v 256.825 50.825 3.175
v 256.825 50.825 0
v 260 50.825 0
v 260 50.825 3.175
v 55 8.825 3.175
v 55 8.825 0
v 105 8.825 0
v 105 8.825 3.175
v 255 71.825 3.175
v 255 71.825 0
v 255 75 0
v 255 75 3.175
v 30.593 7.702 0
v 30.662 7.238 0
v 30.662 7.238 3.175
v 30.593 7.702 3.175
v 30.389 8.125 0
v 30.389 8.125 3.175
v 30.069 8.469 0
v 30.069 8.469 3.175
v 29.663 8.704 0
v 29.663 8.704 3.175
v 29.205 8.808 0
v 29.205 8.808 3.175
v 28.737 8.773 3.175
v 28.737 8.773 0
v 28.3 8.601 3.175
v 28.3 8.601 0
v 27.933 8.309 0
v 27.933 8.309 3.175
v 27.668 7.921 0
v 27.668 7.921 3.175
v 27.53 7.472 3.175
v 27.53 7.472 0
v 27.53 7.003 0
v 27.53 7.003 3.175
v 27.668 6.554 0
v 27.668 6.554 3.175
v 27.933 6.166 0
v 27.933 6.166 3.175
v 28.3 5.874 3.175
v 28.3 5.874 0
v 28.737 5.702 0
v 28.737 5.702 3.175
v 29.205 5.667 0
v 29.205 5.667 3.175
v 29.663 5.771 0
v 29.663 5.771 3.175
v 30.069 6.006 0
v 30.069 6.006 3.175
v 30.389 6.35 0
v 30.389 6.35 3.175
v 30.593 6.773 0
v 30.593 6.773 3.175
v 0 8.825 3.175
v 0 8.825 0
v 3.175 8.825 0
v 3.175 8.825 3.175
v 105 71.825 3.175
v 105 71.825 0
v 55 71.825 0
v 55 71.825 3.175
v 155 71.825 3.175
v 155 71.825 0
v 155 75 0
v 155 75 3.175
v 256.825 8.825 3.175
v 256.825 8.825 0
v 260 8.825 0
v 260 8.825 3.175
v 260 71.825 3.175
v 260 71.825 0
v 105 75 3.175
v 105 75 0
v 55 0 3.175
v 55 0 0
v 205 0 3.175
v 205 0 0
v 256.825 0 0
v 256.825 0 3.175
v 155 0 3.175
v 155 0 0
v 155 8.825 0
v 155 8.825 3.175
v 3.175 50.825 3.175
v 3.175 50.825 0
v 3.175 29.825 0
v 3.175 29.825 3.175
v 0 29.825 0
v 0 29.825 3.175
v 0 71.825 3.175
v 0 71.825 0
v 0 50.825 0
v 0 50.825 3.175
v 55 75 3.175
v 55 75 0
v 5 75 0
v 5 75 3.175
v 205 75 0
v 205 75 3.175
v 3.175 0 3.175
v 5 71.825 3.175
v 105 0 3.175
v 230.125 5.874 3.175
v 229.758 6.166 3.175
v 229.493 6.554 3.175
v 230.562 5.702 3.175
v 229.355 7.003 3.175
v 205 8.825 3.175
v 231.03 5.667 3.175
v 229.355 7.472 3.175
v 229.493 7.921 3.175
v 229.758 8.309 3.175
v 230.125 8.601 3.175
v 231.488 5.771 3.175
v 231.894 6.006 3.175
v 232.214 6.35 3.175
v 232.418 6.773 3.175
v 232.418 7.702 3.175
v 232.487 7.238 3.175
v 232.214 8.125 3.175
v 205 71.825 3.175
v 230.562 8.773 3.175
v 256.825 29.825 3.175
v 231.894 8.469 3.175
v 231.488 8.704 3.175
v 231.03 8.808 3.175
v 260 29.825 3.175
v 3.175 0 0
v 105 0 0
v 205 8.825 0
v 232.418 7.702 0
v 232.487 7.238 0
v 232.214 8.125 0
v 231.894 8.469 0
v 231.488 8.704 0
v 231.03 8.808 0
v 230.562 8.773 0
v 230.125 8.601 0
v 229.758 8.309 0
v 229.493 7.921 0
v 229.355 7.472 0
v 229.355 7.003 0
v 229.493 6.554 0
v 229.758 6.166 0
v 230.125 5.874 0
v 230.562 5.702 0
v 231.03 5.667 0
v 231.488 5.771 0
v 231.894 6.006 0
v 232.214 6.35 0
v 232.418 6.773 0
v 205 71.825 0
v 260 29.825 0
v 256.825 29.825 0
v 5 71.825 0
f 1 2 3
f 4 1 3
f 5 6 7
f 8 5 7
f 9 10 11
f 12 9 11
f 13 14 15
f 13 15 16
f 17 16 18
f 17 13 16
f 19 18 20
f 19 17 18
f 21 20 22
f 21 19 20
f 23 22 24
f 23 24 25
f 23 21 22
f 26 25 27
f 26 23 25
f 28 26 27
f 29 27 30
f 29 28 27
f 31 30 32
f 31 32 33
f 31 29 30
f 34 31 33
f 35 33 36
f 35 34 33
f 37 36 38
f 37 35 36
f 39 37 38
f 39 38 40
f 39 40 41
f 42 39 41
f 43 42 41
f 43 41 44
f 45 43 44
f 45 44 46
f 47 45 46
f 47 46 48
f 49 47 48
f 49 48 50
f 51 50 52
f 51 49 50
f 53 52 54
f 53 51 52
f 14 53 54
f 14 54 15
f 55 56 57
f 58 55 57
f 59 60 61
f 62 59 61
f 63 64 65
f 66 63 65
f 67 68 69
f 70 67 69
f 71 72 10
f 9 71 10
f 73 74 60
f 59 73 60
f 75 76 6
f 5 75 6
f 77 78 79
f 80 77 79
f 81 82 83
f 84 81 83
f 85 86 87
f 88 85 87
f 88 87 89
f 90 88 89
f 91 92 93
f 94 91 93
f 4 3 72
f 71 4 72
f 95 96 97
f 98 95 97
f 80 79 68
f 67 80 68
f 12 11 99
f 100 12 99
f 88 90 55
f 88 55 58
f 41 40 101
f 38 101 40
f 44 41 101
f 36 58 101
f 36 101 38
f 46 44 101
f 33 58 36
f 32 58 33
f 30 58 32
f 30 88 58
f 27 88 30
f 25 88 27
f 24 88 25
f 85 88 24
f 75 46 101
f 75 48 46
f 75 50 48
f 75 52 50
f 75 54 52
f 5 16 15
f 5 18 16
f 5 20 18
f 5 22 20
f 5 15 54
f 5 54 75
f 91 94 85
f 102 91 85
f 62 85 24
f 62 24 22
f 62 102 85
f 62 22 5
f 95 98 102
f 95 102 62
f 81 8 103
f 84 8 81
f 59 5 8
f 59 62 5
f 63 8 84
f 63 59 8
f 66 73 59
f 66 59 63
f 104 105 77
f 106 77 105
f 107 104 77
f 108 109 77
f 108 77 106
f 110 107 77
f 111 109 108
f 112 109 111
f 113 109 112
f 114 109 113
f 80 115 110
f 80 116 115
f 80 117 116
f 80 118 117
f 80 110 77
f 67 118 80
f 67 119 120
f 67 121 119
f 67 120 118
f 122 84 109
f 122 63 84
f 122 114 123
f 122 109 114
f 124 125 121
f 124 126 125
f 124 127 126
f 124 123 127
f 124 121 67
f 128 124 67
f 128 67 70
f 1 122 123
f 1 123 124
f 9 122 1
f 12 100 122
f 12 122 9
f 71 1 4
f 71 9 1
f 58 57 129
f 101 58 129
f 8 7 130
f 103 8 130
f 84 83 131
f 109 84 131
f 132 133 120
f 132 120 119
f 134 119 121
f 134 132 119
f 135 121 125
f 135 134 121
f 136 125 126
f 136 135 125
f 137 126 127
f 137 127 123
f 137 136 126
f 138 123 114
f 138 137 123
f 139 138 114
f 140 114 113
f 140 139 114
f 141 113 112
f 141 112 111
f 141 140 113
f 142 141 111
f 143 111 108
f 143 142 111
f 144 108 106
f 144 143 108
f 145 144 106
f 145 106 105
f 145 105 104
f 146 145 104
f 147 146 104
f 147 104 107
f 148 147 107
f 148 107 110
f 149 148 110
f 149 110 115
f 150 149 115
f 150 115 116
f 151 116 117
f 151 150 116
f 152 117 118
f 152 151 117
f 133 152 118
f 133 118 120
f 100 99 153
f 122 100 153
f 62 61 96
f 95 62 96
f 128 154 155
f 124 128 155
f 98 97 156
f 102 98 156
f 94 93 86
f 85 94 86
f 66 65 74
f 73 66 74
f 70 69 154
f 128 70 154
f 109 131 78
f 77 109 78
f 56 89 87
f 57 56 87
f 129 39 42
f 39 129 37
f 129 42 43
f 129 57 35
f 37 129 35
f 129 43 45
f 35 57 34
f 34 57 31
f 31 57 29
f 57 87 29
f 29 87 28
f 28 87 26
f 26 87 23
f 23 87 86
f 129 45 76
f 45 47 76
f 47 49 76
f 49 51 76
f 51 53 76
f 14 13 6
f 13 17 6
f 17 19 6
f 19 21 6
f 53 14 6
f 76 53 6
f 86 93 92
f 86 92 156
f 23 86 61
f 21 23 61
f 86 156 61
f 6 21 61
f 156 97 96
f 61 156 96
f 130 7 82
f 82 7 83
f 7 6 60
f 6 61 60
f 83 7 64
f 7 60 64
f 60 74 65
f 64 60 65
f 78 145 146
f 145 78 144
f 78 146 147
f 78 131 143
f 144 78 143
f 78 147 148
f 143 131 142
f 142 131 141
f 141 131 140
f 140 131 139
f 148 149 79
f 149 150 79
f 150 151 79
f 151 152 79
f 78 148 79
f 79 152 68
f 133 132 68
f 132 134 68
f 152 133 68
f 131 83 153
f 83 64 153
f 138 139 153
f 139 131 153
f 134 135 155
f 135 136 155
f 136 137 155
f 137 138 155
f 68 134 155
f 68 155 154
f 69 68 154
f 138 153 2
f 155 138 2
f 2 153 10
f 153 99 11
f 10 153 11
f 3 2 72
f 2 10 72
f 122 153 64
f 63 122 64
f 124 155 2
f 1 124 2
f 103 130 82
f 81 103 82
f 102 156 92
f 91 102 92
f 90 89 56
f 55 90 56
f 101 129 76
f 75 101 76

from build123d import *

# Parameters (mm, degrees)
SKETCH1_R           = 1.575
BOSS_EXTRUDE1_DEPTH = 3.175


with BuildPart() as part:
    # Sketch1 → Boss-Extrude1 (new body)
    with BuildSketch(Plane.XY):
        Polygon((55, 75), (5, 75), (5, 71.825), (0, 71.825), (0, 50.825), (3.175, 50.825), (3.175, 29.825), (0, 29.825), (0, 8.825), (3.175, 8.825), (3.175, 0), (55, 0), (55, 8.825), (105, 8.825), (105, 0), (155, 0), (155, 8.825), (205, 8.825), (205, 0), (256.825, 0), (256.825, 8.825), (260, 8.825), (260, 29.825), (256.825, 29.825), (256.825, 50.825), (260, 50.825), (260, 71.825), (255, 71.825), (255, 75), (205, 75), (205, 71.825), (155, 71.825), (155, 75), (105, 75), (105, 71.825), (55, 71.825), align=None)
        with Locations((29.0875, 7.2375)):
            Circle(SKETCH1_R, mode=Mode.SUBTRACT)
        with Locations((230.9125, 7.2375)):
            Circle(SKETCH1_R, mode=Mode.SUBTRACT)
    extrude(amount=BOSS_EXTRUDE1_DEPTH)


solid = part.part
